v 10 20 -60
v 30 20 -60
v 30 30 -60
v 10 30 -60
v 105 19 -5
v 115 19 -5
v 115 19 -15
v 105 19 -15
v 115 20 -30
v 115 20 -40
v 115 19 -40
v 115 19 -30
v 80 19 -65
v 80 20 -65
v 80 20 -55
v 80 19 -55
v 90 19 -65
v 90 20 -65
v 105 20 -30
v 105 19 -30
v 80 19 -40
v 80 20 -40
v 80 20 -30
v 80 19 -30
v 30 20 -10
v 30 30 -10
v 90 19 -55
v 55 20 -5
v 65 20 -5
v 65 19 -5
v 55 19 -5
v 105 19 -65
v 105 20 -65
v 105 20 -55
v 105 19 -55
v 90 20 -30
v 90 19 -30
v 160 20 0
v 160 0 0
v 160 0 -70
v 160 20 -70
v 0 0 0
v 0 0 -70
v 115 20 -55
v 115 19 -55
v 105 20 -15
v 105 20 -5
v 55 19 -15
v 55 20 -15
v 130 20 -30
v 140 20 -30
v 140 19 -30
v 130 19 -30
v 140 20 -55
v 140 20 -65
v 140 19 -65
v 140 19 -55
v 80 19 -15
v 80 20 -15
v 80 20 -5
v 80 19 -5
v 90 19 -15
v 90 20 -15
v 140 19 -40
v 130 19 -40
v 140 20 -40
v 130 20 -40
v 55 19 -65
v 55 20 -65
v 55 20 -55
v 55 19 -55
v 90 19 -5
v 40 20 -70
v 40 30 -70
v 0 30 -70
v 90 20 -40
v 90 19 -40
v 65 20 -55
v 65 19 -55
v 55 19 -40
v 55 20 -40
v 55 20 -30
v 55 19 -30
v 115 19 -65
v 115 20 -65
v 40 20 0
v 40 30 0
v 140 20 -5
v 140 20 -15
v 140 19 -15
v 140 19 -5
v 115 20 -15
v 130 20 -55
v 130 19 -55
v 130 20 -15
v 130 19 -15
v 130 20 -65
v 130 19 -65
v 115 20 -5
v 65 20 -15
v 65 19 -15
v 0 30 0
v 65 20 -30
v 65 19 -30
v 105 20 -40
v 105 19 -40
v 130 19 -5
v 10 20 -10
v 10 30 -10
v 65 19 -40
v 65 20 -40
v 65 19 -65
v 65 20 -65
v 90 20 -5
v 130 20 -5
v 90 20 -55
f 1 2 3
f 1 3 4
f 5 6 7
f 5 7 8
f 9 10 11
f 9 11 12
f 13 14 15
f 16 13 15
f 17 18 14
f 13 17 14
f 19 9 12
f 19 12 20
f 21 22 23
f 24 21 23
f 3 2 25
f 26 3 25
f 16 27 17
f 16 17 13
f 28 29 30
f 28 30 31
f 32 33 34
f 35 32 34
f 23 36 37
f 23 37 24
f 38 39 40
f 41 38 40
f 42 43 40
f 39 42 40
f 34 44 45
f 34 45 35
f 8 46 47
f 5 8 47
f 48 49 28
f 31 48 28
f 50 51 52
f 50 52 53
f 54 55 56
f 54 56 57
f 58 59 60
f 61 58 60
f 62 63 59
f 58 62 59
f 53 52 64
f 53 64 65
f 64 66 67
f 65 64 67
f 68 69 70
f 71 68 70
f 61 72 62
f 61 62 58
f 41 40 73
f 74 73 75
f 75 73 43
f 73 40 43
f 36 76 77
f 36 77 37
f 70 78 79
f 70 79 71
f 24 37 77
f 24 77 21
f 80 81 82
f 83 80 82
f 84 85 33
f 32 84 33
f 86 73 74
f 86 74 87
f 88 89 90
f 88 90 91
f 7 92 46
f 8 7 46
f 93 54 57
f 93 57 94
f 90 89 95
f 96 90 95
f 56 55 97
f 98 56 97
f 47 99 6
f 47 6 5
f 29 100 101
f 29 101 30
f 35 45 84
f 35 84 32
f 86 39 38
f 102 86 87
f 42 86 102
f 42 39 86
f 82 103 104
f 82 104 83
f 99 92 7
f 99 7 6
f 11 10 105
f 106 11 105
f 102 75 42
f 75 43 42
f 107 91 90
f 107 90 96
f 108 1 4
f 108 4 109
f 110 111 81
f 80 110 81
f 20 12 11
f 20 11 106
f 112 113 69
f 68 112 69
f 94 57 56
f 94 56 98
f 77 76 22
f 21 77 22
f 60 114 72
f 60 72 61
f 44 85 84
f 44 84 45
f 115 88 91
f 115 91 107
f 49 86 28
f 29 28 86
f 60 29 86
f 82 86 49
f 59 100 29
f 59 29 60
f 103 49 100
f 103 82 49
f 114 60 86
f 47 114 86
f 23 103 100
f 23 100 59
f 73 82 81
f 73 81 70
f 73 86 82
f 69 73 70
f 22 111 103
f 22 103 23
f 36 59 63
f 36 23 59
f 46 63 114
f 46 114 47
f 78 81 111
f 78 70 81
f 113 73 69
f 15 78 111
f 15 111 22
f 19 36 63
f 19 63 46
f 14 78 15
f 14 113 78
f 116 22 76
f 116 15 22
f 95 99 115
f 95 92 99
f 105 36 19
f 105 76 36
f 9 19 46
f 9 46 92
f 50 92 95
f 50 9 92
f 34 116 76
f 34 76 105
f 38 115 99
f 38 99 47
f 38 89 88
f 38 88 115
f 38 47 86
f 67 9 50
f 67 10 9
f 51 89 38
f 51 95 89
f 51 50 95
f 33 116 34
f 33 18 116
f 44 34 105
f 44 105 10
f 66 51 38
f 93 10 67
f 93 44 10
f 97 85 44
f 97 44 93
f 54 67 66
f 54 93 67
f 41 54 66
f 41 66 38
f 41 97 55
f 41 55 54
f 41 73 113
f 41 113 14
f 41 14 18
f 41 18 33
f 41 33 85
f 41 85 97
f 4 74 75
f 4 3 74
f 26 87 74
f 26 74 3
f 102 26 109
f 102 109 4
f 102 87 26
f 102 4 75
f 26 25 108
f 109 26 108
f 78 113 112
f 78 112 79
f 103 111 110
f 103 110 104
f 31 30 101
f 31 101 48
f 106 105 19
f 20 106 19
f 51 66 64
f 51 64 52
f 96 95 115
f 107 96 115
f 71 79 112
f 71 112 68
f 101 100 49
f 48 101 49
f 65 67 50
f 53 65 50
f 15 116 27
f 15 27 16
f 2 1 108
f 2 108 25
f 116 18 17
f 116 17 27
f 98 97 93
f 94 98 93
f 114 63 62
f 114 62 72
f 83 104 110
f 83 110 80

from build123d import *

# Parameters (mm, degrees)
SKETCH1_W          = 160
SKETCH1_H          = 70
EXTRUDE1_DEPTH     = 20
SKETCH2_W          = 40
SKETCH2_H          = 70
SKETCH2_W_2        = 20
SKETCH2_H_2        = 50
EXTRUDE2_DEPTH     = 10
SKETCH3_W          = 10
SKETCH3_H          = 10
CUT_EXTRUDE1_DEPTH = 1


with BuildPart() as part:
    # Sketch1 → Extrude1 (new body)
    with BuildSketch(Plane(origin=(0, 0, 0), x_dir=(1, 0, 0), z_dir=(0, 1, 0))):
        with Locations((80, 35)):
            Rectangle(SKETCH1_W, SKETCH1_H)
    extrude(amount=EXTRUDE1_DEPTH)

    # Sketch2 → Extrude2 (add)
    with BuildSketch(Plane(origin=(0, 20, 0), x_dir=(-1, 0, 0), z_dir=(0, 1, 0))):
        with Locations((-20, -35)):
            Rectangle(SKETCH2_W, SKETCH2_H)
        with Locations((-20, -35)):
            Rectangle(SKETCH2_W_2, SKETCH2_H_2, mode=Mode.SUBTRACT)
    extrude(amount=EXTRUDE2_DEPTH)

    # Sketch3 → Cut-Extrude1 (cut)
    with BuildSketch(Plane(origin=(0, 20, 0), x_dir=(-1, 0, 0), z_dir=(0, 1, 0))):
        with Locations((-110, -60)):
            Rectangle(SKETCH3_W, SKETCH3_H)
        with Locations((-110, -35)):
            Rectangle(SKETCH3_W, SKETCH3_H)
        with Locations((-135, -35)):
            Rectangle(SKETCH3_W, SKETCH3_H)
        with Locations((-60, -60)):
            Rectangle(SKETCH3_W, SKETCH3_H)
        with Locations((-60, -10)):
            Rectangle(SKETCH3_W, SKETCH3_H)
        with Locations((-135, -60)):
            Rectangle(SKETCH3_W, SKETCH3_H)
        with Locations((-135, -10)):
            Rectangle(SKETCH3_W, SKETCH3_H)
        with Locations((-110, -10)):
            Rectangle(SKETCH3_W, SKETCH3_H)
        with Locations((-85, -10)):
            Rectangle(SKETCH3_W, SKETCH3_H)
        with Locations((-85, -60)):
            Rectangle(SKETCH3_W, SKETCH3_H)
        with Locations((-60, -35)):
            Rectangle(SKETCH3_W, SKETCH3_H)
        with Locations((-85, -35)):
            Rectangle(SKETCH3_W, SKETCH3_H)
    extrude(amount=-CUT_EXTRUDE1_DEPTH, mode=Mode.SUBTRACT)


solid = part.part
